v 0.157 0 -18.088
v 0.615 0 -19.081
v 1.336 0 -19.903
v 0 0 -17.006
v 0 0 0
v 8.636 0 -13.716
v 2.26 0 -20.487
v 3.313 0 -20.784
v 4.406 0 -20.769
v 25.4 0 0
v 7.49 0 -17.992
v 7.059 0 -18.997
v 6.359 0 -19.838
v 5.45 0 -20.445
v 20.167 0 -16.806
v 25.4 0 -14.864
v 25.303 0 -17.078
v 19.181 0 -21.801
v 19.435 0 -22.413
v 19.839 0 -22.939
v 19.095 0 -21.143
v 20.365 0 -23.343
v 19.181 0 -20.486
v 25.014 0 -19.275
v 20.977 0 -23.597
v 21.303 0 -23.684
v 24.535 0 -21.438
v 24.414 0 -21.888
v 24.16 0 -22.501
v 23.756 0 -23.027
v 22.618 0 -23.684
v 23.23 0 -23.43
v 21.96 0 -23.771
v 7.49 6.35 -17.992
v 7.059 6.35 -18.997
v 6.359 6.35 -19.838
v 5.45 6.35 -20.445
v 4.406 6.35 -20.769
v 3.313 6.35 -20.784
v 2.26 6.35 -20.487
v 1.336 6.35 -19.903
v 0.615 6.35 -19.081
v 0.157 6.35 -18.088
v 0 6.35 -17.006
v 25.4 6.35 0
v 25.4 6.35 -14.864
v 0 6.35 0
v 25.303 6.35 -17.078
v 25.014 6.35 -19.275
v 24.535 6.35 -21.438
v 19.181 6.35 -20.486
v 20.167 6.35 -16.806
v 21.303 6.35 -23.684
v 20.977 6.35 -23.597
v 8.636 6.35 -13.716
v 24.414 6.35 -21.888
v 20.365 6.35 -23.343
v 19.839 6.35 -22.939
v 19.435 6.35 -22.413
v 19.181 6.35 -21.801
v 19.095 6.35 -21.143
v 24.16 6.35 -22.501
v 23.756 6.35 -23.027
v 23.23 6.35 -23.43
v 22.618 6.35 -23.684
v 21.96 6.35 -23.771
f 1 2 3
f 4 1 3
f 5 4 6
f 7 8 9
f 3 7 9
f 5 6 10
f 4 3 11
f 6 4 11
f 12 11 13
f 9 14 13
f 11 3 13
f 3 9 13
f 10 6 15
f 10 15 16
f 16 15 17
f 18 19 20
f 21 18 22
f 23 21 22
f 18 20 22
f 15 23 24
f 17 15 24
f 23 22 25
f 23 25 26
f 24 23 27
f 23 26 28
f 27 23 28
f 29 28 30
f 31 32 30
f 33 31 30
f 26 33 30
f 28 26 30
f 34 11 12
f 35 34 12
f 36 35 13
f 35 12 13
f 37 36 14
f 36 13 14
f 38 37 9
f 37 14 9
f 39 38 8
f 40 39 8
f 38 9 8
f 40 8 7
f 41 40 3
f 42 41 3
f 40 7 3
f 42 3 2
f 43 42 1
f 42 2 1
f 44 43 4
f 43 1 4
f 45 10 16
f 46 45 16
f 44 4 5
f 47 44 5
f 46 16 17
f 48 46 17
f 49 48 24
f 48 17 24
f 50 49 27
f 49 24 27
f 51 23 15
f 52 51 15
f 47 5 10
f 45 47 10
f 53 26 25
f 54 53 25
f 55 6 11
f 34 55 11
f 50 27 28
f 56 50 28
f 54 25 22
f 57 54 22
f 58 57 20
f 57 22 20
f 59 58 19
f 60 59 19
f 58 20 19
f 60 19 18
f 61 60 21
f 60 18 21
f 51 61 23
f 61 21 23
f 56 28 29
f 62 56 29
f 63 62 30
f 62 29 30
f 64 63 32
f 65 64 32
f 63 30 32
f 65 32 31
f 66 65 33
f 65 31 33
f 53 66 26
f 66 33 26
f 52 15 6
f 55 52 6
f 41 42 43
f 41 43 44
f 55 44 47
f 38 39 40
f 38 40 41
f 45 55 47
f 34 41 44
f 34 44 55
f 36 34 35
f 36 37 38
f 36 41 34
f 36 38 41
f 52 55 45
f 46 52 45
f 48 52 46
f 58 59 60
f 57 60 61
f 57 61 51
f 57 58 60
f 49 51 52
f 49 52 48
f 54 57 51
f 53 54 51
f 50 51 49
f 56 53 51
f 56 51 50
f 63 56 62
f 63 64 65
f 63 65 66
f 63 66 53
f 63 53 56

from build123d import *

# Parameters (mm, degrees)
BOSS_EXTRUDE1_DEPTH = 6.35


with BuildPart() as part:
    # Sketch1 → Boss-Extrude1 (new body)
    with BuildSketch(Plane(origin=(0, 0, 0), x_dir=(1, 0, 0), z_dir=(0, 1, 0))):
        with BuildLine():
            Line((0, 0), (25.4, 0))
            Line((25.4, 0), (25.4, 14.863926823))
            ThreePointArc((25.4, 14.863926823), (25.182699479, 18.179292106), (24.534515988, 21.437930569))
            Line((24.534515988, 21.437930569), (24.413899438, 21.88807766))
            ThreePointArc((24.413899438, 21.88807766), (23.230447839, 23.430381811), (21.303047465, 23.684128884))
            Line((21.303047465, 23.684128884), (20.977173177, 23.596811132))
            ThreePointArc((20.977173177, 23.596811132), (19.434869026, 22.413359533), (19.181121952, 20.485959159))
            Line((19.181121952, 20.485959159), (20.167222514, 16.80578176))
            Line((20.167222514, 16.80578176), (8.636, 13.716))
            Line((8.636, 13.716), (7.490177398, 17.992268167))
            ThreePointArc((7.490177398, 17.992268167), (3.312695208, 20.783572527), (0, 17.006167605))
            Line((0, 17.006167605), (0, 0))
        make_face()
    extrude(amount=BOSS_EXTRUDE1_DEPTH)


solid = part.part
